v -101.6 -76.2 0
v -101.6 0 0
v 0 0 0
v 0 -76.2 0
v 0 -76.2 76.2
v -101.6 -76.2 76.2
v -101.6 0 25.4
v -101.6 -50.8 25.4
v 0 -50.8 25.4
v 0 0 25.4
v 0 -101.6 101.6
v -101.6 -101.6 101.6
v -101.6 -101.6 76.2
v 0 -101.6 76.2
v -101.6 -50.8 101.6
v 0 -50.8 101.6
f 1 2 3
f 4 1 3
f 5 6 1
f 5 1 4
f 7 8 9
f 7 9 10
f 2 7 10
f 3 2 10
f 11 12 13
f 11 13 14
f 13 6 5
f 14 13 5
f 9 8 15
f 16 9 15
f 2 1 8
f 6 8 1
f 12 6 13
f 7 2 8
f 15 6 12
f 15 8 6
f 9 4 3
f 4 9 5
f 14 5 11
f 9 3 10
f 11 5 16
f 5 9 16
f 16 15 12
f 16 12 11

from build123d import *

# Parameters (mm, degrees)
F0_W     = 101.6
F0_H     = 101.6
F1_DEPTH = 76.2
F3_W     = 101.6
F3_H     = 25.4
F4_DEPTH = 25.4
F2_W     = 50.8
F2_H     = 76.2
F5_DEPTH = 101.6


with BuildPart() as f1:
    # F0 (on Front) → F1 (new body)
    with BuildSketch(Plane.XZ):
        with Locations((-50.8, 50.8)):
            Rectangle(F0_W, F0_H)
    extrude(amount=F1_DEPTH)

    # F3 (on face) → F4 (join)
    with BuildSketch(Plane.XZ.offset(76.2)):
        with Locations((-50.8, 88.9)):
            Rectangle(F3_W, F3_H)
    extrude(amount=F4_DEPTH)

    # F2 (on face) → F5 (cut)
    with BuildSketch(Plane.YZ):
        with Locations((-25.4, 63.5)):
            Rectangle(F2_W, F2_H)
    extrude(amount=-F5_DEPTH, mode=Mode.SUBTRACT)


solid = f1.part
